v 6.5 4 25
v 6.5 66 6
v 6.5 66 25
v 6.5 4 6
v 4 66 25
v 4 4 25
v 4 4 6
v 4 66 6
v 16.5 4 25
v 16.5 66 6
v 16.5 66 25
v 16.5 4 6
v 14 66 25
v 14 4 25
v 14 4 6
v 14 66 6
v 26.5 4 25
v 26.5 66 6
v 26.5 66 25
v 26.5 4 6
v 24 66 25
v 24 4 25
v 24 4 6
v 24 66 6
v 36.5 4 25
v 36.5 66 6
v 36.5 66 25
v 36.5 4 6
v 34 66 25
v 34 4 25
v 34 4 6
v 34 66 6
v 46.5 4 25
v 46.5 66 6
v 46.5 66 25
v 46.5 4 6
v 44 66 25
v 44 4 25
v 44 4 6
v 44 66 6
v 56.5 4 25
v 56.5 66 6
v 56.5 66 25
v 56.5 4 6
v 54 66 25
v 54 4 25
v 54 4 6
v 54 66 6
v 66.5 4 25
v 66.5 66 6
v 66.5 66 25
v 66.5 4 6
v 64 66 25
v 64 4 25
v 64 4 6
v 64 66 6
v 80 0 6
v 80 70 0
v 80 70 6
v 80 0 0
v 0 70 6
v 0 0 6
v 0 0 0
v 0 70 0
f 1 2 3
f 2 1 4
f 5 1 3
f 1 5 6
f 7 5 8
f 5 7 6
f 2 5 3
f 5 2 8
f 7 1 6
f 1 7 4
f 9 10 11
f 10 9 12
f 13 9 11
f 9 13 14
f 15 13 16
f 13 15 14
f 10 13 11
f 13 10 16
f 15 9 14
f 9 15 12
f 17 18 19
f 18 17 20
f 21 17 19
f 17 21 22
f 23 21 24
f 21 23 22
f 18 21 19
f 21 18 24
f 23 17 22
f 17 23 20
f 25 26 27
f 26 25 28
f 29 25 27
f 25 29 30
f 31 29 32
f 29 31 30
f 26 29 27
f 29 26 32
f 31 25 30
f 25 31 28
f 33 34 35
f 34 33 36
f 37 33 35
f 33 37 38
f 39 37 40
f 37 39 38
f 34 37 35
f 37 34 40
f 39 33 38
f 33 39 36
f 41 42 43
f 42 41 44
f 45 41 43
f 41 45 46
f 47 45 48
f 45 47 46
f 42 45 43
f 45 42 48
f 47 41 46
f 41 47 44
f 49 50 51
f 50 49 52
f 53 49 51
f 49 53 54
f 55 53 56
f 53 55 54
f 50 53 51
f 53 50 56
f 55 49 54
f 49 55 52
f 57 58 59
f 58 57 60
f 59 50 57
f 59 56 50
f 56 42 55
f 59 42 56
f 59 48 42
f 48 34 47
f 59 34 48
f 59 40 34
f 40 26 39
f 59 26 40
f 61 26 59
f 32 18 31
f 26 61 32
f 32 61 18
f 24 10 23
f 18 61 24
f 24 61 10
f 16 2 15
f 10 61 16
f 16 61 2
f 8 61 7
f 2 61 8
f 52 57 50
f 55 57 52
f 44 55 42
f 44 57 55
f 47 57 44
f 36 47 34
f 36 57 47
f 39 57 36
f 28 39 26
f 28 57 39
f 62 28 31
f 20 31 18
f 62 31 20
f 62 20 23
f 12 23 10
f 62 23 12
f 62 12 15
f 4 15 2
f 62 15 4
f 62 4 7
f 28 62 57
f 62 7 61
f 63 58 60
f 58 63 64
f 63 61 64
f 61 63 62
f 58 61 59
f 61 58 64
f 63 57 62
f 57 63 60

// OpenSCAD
$fn = 32;

// ----------------------------------------------------------------------
// Heatsink: uniform fin block
// ----------------------------------------------------------------------

// --- parameters (mm) ---
base_l = 80;              // base length, X
base_w = 70;              // base width, Y
base_t = 6;               // base plate thickness
fin_h = 20;               // fin height above the base
fin_t = 2.5;              // fin thickness
edge = 4;                 // margin from the base ends
pitch = 10;               // fin pitch

n_fins = floor((base_l - 2 * edge - fin_t) / pitch) + 1;  // fin count
total_h = base_t + fin_h - 1;  // overall height

union() {
  cube([base_l, base_w, base_t]);
  for (i = [0 : n_fins - 1])
    translate([edge + i * pitch, edge, base_t - 1])
      cube([fin_t, base_w - 2 * edge, fin_h]);
}
